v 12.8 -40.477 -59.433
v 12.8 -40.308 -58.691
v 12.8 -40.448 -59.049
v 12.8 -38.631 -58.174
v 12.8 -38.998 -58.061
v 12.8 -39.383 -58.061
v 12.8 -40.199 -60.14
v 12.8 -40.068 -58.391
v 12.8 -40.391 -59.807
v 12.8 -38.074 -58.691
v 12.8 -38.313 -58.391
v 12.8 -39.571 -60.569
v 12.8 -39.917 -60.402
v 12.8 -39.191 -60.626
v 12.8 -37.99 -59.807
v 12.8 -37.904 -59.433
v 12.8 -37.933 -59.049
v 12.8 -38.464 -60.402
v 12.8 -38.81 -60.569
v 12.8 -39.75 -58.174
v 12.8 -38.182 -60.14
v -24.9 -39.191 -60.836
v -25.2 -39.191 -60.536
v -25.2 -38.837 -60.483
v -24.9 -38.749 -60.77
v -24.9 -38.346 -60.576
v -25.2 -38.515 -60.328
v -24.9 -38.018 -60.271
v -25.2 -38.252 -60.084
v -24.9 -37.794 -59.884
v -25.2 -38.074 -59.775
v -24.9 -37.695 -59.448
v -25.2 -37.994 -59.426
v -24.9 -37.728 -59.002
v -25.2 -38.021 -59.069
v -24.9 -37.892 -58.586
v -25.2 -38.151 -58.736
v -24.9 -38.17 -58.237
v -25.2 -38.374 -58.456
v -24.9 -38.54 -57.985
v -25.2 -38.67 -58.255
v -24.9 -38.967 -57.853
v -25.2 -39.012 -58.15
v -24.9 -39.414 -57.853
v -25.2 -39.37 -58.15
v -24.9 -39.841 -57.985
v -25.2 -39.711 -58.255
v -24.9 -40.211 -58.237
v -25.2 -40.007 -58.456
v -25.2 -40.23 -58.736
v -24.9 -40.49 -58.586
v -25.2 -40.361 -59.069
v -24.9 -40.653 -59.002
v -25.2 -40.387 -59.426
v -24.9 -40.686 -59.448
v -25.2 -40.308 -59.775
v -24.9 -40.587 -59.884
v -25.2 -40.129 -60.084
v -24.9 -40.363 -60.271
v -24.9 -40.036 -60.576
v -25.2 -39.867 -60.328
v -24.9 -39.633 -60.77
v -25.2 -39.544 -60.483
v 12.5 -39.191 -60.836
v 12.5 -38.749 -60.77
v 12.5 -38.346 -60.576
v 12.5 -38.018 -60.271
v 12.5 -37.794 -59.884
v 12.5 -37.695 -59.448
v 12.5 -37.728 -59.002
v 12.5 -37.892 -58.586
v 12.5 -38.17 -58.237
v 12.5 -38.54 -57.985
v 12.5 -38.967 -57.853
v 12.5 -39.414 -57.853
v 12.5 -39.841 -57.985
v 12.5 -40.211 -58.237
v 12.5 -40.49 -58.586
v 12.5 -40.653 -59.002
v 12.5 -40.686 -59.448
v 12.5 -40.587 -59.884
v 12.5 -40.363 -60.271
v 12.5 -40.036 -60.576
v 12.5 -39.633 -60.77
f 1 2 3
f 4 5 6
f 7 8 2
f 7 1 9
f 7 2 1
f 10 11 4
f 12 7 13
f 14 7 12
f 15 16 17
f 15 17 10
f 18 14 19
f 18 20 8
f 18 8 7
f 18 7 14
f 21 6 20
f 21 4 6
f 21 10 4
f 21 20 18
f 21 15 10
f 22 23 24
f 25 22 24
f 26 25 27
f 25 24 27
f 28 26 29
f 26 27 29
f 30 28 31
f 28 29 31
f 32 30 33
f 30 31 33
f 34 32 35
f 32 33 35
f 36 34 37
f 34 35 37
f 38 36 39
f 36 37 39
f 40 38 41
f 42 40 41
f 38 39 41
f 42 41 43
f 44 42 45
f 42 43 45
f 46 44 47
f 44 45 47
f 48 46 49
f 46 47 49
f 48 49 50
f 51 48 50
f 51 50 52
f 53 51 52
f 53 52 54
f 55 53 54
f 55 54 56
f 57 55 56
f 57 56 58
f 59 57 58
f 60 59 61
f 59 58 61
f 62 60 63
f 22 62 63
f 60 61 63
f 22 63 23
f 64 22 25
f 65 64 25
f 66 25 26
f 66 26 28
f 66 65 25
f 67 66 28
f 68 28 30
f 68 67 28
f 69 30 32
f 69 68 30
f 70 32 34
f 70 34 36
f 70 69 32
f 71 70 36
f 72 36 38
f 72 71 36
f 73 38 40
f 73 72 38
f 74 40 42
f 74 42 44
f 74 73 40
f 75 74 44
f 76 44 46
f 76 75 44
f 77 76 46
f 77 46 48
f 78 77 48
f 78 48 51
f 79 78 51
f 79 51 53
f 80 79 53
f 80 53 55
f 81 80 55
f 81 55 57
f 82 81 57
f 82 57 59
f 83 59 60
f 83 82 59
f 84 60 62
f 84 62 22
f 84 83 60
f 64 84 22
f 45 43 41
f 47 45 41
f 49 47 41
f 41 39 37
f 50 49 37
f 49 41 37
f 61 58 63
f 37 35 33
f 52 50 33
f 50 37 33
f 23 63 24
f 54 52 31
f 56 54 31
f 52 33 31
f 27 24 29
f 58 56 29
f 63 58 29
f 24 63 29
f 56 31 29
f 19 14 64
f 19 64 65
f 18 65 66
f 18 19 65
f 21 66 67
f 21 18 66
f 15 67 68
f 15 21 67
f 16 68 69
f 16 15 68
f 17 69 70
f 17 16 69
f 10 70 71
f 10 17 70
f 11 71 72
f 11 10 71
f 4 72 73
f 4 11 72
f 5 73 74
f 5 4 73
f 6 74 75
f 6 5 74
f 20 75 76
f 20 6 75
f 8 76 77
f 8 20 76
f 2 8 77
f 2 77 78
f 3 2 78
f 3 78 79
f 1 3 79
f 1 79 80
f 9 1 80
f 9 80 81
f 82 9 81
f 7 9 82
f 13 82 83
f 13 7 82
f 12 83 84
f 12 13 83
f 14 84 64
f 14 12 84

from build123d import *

# Parameters (mm, degrees)
ESQUISSE2_R        = 1.5
BOSS_EXTRU_1_DEPTH = 38
CHANFREIN4_SIZE    = 0.3
CHANFREIN4_SIZE2   = 0.210062261
CHANFREIN5_SIZE    = 0.3


with BuildPart() as part:
    # Esquisse2 → Boss.-Extru.1 (new body)
    with BuildSketch(Plane(origin=(12.8, 0, 0), x_dir=(0, 0, -1), z_dir=(1, 0, 0))):
        with Locations((59.336151833, -39.190660447)):
            Circle(ESQUISSE2_R)
    extrude(amount=-BOSS_EXTRU_1_DEPTH)

    # Chanfrein4
    chanfrein4_edges = [part.edges().sort_by_distance(p)[0] for p in [
        (12.8, -39.190660447, -57.836151833),
    ]]
    chanfrein4_side = [part.faces().sort_by_distance(p)[0] for p in [
        (-6.2, -39.190660447, -57.836151833),
    ]]
    chamfer(chanfrein4_edges, length=CHANFREIN4_SIZE, length2=CHANFREIN4_SIZE2, reference=chanfrein4_side[0])

    # Chanfrein5
    chanfrein5_edges = [part.edges().sort_by_distance(p)[0] for p in [
        (-25.2, -39.190660447, -57.836151833),
    ]]
    chamfer(chanfrein5_edges, length=CHANFREIN5_SIZE)


solid = part.part
